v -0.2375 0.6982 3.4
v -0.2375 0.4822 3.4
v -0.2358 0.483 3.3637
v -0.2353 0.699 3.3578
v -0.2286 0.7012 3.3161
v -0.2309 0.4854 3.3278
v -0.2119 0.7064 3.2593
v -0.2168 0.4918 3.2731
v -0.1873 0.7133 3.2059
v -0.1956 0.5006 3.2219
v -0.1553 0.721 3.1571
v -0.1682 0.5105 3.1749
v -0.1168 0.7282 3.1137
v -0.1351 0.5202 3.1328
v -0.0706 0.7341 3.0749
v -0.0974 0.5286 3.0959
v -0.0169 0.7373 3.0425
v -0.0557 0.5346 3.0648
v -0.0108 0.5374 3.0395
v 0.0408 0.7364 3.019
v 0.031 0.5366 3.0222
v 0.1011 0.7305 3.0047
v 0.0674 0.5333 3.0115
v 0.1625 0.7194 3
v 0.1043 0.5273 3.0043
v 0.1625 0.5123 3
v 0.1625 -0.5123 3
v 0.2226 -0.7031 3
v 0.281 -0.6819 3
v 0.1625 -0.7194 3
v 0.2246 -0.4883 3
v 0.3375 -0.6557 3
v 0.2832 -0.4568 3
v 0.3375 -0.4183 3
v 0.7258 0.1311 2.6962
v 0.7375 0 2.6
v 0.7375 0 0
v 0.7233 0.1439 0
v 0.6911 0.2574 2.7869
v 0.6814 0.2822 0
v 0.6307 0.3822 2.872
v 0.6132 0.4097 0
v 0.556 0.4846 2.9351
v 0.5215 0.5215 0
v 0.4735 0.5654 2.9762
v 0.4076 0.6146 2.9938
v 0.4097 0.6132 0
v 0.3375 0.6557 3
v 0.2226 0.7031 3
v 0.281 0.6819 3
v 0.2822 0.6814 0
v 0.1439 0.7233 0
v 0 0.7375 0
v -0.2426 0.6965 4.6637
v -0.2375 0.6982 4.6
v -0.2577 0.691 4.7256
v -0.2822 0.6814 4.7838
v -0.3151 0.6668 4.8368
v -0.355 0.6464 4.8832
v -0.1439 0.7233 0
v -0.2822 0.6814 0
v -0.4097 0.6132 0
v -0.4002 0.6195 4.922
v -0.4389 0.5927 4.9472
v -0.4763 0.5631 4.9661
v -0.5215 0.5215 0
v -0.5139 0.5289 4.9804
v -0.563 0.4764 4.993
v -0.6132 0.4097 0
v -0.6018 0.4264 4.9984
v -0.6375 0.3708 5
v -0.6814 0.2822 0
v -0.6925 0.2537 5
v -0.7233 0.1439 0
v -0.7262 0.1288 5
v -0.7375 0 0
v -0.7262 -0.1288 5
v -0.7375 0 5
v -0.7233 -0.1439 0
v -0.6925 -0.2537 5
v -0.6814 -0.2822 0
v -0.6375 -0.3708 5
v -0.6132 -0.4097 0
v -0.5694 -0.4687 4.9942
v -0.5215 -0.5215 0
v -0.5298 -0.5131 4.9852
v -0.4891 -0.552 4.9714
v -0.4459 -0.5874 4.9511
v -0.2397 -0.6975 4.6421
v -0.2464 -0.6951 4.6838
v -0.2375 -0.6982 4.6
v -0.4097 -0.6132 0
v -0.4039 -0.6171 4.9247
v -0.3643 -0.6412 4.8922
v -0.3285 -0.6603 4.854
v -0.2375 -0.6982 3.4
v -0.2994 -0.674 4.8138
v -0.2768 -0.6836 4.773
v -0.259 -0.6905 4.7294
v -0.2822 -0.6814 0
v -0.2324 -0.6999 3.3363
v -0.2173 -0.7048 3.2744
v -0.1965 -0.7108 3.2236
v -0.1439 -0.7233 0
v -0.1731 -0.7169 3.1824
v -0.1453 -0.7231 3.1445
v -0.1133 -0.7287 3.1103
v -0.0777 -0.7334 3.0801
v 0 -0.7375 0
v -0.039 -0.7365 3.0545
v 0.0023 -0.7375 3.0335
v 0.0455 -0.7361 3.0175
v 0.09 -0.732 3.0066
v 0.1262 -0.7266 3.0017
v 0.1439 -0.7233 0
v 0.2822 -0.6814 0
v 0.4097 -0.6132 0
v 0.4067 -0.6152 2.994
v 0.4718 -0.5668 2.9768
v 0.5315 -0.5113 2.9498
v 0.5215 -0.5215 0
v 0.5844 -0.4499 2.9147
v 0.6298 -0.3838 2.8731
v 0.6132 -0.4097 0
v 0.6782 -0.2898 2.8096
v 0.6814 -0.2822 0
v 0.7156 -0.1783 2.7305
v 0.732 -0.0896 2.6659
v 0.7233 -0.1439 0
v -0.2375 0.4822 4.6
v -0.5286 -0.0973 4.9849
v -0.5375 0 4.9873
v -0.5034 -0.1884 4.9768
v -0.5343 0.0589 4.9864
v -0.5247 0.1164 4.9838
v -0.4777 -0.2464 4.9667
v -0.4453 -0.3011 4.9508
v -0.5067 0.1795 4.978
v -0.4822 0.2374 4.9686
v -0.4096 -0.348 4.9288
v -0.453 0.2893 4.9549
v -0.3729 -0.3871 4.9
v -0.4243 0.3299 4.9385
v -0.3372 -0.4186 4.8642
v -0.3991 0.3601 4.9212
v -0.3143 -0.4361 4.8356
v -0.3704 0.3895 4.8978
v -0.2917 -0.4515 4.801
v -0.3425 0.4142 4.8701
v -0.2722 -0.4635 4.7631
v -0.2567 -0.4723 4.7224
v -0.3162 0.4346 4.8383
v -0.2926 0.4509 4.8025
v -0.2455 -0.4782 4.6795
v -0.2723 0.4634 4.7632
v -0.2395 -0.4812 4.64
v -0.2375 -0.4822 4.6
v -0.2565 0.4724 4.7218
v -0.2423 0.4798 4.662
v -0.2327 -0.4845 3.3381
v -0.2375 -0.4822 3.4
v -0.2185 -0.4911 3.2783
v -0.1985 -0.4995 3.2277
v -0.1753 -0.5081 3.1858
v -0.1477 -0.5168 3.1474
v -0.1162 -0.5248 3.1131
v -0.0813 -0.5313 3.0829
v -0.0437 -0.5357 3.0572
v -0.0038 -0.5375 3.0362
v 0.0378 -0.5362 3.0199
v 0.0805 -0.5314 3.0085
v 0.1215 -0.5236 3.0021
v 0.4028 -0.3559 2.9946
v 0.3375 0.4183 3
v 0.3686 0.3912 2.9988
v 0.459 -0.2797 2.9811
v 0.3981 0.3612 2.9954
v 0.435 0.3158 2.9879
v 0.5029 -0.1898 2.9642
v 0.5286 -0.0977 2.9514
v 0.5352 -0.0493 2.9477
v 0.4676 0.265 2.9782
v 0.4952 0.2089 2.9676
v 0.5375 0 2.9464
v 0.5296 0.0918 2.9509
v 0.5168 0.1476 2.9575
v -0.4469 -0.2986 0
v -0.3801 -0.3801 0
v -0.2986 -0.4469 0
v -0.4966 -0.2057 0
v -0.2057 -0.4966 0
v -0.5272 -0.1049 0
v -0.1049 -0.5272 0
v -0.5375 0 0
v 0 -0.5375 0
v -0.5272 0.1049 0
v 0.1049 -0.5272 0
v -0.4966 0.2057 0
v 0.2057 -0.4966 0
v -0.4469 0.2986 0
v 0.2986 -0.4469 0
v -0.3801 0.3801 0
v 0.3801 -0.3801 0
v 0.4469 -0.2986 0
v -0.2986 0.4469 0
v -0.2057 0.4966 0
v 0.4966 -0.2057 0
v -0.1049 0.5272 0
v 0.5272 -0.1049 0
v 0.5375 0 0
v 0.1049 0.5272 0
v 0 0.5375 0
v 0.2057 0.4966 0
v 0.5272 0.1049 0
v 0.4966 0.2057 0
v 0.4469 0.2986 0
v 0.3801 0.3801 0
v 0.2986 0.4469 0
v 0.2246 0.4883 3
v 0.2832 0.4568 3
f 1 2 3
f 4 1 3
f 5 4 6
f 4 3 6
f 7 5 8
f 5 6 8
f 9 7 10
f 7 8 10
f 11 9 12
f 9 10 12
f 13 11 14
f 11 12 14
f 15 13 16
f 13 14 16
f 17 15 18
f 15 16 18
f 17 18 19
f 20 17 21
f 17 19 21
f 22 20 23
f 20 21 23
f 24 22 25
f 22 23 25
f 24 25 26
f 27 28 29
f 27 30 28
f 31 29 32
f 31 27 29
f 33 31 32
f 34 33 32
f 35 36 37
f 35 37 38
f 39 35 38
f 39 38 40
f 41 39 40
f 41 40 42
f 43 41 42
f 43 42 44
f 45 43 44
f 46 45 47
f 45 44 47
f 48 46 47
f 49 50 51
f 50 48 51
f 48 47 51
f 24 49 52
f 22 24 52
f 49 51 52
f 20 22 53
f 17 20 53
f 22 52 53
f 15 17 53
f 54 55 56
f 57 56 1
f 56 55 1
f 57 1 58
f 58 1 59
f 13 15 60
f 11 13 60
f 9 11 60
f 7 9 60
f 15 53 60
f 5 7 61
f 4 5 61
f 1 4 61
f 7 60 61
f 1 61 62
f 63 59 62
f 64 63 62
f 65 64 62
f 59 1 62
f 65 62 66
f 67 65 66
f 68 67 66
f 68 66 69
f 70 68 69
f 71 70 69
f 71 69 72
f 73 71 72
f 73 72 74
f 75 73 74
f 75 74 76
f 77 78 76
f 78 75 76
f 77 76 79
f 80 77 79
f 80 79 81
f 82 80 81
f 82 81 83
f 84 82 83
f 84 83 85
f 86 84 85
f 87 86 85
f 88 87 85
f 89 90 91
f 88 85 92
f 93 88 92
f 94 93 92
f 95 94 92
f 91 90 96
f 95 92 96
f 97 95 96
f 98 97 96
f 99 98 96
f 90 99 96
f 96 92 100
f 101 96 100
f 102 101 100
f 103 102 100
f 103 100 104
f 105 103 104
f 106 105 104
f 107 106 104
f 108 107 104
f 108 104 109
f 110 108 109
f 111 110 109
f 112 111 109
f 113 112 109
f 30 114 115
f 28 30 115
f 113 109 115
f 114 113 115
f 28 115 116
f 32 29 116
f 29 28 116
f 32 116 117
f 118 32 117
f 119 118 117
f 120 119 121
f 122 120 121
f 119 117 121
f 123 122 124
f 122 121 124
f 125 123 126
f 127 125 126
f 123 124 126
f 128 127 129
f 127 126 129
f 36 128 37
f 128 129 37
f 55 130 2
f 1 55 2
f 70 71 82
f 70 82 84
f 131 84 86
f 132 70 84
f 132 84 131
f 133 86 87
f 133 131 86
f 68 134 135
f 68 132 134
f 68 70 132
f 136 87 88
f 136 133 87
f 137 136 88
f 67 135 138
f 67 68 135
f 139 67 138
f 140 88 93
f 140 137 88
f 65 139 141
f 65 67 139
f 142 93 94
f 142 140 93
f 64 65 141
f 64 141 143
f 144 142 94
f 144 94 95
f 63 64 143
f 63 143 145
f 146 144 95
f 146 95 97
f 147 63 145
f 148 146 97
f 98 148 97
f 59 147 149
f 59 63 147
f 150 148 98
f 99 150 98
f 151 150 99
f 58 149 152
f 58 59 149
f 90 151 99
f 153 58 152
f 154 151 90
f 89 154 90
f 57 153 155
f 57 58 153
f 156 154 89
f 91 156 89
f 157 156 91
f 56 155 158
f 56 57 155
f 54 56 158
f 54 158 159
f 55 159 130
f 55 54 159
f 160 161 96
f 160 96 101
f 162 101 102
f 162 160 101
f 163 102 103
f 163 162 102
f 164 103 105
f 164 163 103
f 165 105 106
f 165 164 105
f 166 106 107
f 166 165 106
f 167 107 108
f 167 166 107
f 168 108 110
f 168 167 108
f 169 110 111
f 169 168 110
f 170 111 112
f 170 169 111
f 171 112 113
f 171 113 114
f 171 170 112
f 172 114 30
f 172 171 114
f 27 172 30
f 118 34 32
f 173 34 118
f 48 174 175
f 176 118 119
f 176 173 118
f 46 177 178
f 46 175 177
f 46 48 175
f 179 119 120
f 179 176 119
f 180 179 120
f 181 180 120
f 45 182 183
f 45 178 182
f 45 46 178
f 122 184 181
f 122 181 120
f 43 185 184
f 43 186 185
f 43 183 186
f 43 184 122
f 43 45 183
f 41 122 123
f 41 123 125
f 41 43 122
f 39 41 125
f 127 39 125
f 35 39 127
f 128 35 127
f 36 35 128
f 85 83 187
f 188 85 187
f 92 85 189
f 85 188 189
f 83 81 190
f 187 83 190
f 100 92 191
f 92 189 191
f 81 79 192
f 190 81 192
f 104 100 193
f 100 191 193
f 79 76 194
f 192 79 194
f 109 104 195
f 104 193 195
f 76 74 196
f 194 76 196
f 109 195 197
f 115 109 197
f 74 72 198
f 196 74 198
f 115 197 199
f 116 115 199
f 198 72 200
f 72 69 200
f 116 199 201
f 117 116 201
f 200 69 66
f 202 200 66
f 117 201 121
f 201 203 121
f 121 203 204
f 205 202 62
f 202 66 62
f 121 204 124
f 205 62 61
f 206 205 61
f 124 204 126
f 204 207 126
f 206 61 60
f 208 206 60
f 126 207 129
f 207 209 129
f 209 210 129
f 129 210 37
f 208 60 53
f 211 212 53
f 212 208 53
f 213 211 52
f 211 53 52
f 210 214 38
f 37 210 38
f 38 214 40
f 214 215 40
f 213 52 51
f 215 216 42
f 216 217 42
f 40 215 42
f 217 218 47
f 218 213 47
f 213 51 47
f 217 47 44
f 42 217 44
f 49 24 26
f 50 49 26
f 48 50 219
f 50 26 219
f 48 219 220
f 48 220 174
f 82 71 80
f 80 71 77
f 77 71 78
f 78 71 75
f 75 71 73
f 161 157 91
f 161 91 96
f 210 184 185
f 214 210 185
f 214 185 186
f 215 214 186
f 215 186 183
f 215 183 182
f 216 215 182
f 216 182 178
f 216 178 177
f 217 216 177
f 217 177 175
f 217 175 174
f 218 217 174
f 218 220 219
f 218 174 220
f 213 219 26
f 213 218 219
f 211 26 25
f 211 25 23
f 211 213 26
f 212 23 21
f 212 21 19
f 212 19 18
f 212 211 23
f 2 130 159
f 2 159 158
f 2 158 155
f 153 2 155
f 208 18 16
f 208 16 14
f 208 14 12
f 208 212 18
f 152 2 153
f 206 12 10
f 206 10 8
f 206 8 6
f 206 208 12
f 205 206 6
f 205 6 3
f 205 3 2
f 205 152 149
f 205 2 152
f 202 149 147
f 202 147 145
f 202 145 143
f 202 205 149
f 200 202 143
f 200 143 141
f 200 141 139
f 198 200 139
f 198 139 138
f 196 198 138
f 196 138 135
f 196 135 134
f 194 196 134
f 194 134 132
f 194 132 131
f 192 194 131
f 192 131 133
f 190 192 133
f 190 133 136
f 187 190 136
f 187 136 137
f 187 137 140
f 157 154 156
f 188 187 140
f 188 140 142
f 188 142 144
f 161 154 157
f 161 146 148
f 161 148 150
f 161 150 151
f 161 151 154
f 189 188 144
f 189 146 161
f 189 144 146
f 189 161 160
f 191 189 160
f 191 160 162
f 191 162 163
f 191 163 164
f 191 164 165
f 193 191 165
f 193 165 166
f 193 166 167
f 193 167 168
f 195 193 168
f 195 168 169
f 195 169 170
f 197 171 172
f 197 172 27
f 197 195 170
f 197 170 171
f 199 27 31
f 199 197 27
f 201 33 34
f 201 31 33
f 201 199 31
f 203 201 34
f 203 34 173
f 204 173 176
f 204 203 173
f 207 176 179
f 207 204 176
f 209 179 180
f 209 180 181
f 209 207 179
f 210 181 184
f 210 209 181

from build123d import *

# Parameters (mm, degrees)
SKETCH1_R               = 0.7375
SKETCH1_R_2             = 0.5375
BOSS_EXTRUDE1_DEPTH     = 5
CUT_EXTRUDE1_DEPTH      = 2
CUT_EXTRUDE1_DEPTH_BACK = 2


with BuildPart() as part:
    # Sketch1 → Boss-Extrude1 (new body)
    with BuildSketch(Plane.XY):
        Circle(SKETCH1_R)
        Circle(SKETCH1_R_2, mode=Mode.SUBTRACT)
    extrude(amount=BOSS_EXTRUDE1_DEPTH)

    # Sketch3 → Cut-Extrude1 (cut, two sides: drawn at the far end of the back side and taken through both)
    with BuildSketch(Plane(origin=(0, 0, 0), x_dir=(1, 0, 0), z_dir=(0, 1, 0)).offset(-CUT_EXTRUDE1_DEPTH_BACK)):
        with BuildLine():
            Line((-0.7375, -5), (-0.6375, -5))
            ThreePointArc((-0.6375, -5), (-0.354657288, -4.882842712), (-0.2375, -4.6))
            Line((-0.2375, -4.6), (-0.2375, -3.4))
            ThreePointArc((-0.2375, -3.4), (-0.120342712, -3.117157288), (0.1625, -3))
            Line((0.1625, -3), (0.3375, -3))
            ThreePointArc((0.3375, -3), (0.620342712, -2.882842712), (0.7375, -2.6))
            Line((0.7375, -2.6), (0.7375, -2.290424198))
            Line((0.7375, -2.290424198), (1.0406043, -2.290424198))
            Line((1.0406043, -2.290424198), (1.0406043, -5.289304035))
            Line((1.0406043, -5.289304035), (-0.7375, -5.289304035))
            Line((-0.7375, -5.289304035), (-0.7375, -5))
        make_face()
    extrude(amount=CUT_EXTRUDE1_DEPTH + CUT_EXTRUDE1_DEPTH_BACK, mode=Mode.SUBTRACT)


solid = part.part
